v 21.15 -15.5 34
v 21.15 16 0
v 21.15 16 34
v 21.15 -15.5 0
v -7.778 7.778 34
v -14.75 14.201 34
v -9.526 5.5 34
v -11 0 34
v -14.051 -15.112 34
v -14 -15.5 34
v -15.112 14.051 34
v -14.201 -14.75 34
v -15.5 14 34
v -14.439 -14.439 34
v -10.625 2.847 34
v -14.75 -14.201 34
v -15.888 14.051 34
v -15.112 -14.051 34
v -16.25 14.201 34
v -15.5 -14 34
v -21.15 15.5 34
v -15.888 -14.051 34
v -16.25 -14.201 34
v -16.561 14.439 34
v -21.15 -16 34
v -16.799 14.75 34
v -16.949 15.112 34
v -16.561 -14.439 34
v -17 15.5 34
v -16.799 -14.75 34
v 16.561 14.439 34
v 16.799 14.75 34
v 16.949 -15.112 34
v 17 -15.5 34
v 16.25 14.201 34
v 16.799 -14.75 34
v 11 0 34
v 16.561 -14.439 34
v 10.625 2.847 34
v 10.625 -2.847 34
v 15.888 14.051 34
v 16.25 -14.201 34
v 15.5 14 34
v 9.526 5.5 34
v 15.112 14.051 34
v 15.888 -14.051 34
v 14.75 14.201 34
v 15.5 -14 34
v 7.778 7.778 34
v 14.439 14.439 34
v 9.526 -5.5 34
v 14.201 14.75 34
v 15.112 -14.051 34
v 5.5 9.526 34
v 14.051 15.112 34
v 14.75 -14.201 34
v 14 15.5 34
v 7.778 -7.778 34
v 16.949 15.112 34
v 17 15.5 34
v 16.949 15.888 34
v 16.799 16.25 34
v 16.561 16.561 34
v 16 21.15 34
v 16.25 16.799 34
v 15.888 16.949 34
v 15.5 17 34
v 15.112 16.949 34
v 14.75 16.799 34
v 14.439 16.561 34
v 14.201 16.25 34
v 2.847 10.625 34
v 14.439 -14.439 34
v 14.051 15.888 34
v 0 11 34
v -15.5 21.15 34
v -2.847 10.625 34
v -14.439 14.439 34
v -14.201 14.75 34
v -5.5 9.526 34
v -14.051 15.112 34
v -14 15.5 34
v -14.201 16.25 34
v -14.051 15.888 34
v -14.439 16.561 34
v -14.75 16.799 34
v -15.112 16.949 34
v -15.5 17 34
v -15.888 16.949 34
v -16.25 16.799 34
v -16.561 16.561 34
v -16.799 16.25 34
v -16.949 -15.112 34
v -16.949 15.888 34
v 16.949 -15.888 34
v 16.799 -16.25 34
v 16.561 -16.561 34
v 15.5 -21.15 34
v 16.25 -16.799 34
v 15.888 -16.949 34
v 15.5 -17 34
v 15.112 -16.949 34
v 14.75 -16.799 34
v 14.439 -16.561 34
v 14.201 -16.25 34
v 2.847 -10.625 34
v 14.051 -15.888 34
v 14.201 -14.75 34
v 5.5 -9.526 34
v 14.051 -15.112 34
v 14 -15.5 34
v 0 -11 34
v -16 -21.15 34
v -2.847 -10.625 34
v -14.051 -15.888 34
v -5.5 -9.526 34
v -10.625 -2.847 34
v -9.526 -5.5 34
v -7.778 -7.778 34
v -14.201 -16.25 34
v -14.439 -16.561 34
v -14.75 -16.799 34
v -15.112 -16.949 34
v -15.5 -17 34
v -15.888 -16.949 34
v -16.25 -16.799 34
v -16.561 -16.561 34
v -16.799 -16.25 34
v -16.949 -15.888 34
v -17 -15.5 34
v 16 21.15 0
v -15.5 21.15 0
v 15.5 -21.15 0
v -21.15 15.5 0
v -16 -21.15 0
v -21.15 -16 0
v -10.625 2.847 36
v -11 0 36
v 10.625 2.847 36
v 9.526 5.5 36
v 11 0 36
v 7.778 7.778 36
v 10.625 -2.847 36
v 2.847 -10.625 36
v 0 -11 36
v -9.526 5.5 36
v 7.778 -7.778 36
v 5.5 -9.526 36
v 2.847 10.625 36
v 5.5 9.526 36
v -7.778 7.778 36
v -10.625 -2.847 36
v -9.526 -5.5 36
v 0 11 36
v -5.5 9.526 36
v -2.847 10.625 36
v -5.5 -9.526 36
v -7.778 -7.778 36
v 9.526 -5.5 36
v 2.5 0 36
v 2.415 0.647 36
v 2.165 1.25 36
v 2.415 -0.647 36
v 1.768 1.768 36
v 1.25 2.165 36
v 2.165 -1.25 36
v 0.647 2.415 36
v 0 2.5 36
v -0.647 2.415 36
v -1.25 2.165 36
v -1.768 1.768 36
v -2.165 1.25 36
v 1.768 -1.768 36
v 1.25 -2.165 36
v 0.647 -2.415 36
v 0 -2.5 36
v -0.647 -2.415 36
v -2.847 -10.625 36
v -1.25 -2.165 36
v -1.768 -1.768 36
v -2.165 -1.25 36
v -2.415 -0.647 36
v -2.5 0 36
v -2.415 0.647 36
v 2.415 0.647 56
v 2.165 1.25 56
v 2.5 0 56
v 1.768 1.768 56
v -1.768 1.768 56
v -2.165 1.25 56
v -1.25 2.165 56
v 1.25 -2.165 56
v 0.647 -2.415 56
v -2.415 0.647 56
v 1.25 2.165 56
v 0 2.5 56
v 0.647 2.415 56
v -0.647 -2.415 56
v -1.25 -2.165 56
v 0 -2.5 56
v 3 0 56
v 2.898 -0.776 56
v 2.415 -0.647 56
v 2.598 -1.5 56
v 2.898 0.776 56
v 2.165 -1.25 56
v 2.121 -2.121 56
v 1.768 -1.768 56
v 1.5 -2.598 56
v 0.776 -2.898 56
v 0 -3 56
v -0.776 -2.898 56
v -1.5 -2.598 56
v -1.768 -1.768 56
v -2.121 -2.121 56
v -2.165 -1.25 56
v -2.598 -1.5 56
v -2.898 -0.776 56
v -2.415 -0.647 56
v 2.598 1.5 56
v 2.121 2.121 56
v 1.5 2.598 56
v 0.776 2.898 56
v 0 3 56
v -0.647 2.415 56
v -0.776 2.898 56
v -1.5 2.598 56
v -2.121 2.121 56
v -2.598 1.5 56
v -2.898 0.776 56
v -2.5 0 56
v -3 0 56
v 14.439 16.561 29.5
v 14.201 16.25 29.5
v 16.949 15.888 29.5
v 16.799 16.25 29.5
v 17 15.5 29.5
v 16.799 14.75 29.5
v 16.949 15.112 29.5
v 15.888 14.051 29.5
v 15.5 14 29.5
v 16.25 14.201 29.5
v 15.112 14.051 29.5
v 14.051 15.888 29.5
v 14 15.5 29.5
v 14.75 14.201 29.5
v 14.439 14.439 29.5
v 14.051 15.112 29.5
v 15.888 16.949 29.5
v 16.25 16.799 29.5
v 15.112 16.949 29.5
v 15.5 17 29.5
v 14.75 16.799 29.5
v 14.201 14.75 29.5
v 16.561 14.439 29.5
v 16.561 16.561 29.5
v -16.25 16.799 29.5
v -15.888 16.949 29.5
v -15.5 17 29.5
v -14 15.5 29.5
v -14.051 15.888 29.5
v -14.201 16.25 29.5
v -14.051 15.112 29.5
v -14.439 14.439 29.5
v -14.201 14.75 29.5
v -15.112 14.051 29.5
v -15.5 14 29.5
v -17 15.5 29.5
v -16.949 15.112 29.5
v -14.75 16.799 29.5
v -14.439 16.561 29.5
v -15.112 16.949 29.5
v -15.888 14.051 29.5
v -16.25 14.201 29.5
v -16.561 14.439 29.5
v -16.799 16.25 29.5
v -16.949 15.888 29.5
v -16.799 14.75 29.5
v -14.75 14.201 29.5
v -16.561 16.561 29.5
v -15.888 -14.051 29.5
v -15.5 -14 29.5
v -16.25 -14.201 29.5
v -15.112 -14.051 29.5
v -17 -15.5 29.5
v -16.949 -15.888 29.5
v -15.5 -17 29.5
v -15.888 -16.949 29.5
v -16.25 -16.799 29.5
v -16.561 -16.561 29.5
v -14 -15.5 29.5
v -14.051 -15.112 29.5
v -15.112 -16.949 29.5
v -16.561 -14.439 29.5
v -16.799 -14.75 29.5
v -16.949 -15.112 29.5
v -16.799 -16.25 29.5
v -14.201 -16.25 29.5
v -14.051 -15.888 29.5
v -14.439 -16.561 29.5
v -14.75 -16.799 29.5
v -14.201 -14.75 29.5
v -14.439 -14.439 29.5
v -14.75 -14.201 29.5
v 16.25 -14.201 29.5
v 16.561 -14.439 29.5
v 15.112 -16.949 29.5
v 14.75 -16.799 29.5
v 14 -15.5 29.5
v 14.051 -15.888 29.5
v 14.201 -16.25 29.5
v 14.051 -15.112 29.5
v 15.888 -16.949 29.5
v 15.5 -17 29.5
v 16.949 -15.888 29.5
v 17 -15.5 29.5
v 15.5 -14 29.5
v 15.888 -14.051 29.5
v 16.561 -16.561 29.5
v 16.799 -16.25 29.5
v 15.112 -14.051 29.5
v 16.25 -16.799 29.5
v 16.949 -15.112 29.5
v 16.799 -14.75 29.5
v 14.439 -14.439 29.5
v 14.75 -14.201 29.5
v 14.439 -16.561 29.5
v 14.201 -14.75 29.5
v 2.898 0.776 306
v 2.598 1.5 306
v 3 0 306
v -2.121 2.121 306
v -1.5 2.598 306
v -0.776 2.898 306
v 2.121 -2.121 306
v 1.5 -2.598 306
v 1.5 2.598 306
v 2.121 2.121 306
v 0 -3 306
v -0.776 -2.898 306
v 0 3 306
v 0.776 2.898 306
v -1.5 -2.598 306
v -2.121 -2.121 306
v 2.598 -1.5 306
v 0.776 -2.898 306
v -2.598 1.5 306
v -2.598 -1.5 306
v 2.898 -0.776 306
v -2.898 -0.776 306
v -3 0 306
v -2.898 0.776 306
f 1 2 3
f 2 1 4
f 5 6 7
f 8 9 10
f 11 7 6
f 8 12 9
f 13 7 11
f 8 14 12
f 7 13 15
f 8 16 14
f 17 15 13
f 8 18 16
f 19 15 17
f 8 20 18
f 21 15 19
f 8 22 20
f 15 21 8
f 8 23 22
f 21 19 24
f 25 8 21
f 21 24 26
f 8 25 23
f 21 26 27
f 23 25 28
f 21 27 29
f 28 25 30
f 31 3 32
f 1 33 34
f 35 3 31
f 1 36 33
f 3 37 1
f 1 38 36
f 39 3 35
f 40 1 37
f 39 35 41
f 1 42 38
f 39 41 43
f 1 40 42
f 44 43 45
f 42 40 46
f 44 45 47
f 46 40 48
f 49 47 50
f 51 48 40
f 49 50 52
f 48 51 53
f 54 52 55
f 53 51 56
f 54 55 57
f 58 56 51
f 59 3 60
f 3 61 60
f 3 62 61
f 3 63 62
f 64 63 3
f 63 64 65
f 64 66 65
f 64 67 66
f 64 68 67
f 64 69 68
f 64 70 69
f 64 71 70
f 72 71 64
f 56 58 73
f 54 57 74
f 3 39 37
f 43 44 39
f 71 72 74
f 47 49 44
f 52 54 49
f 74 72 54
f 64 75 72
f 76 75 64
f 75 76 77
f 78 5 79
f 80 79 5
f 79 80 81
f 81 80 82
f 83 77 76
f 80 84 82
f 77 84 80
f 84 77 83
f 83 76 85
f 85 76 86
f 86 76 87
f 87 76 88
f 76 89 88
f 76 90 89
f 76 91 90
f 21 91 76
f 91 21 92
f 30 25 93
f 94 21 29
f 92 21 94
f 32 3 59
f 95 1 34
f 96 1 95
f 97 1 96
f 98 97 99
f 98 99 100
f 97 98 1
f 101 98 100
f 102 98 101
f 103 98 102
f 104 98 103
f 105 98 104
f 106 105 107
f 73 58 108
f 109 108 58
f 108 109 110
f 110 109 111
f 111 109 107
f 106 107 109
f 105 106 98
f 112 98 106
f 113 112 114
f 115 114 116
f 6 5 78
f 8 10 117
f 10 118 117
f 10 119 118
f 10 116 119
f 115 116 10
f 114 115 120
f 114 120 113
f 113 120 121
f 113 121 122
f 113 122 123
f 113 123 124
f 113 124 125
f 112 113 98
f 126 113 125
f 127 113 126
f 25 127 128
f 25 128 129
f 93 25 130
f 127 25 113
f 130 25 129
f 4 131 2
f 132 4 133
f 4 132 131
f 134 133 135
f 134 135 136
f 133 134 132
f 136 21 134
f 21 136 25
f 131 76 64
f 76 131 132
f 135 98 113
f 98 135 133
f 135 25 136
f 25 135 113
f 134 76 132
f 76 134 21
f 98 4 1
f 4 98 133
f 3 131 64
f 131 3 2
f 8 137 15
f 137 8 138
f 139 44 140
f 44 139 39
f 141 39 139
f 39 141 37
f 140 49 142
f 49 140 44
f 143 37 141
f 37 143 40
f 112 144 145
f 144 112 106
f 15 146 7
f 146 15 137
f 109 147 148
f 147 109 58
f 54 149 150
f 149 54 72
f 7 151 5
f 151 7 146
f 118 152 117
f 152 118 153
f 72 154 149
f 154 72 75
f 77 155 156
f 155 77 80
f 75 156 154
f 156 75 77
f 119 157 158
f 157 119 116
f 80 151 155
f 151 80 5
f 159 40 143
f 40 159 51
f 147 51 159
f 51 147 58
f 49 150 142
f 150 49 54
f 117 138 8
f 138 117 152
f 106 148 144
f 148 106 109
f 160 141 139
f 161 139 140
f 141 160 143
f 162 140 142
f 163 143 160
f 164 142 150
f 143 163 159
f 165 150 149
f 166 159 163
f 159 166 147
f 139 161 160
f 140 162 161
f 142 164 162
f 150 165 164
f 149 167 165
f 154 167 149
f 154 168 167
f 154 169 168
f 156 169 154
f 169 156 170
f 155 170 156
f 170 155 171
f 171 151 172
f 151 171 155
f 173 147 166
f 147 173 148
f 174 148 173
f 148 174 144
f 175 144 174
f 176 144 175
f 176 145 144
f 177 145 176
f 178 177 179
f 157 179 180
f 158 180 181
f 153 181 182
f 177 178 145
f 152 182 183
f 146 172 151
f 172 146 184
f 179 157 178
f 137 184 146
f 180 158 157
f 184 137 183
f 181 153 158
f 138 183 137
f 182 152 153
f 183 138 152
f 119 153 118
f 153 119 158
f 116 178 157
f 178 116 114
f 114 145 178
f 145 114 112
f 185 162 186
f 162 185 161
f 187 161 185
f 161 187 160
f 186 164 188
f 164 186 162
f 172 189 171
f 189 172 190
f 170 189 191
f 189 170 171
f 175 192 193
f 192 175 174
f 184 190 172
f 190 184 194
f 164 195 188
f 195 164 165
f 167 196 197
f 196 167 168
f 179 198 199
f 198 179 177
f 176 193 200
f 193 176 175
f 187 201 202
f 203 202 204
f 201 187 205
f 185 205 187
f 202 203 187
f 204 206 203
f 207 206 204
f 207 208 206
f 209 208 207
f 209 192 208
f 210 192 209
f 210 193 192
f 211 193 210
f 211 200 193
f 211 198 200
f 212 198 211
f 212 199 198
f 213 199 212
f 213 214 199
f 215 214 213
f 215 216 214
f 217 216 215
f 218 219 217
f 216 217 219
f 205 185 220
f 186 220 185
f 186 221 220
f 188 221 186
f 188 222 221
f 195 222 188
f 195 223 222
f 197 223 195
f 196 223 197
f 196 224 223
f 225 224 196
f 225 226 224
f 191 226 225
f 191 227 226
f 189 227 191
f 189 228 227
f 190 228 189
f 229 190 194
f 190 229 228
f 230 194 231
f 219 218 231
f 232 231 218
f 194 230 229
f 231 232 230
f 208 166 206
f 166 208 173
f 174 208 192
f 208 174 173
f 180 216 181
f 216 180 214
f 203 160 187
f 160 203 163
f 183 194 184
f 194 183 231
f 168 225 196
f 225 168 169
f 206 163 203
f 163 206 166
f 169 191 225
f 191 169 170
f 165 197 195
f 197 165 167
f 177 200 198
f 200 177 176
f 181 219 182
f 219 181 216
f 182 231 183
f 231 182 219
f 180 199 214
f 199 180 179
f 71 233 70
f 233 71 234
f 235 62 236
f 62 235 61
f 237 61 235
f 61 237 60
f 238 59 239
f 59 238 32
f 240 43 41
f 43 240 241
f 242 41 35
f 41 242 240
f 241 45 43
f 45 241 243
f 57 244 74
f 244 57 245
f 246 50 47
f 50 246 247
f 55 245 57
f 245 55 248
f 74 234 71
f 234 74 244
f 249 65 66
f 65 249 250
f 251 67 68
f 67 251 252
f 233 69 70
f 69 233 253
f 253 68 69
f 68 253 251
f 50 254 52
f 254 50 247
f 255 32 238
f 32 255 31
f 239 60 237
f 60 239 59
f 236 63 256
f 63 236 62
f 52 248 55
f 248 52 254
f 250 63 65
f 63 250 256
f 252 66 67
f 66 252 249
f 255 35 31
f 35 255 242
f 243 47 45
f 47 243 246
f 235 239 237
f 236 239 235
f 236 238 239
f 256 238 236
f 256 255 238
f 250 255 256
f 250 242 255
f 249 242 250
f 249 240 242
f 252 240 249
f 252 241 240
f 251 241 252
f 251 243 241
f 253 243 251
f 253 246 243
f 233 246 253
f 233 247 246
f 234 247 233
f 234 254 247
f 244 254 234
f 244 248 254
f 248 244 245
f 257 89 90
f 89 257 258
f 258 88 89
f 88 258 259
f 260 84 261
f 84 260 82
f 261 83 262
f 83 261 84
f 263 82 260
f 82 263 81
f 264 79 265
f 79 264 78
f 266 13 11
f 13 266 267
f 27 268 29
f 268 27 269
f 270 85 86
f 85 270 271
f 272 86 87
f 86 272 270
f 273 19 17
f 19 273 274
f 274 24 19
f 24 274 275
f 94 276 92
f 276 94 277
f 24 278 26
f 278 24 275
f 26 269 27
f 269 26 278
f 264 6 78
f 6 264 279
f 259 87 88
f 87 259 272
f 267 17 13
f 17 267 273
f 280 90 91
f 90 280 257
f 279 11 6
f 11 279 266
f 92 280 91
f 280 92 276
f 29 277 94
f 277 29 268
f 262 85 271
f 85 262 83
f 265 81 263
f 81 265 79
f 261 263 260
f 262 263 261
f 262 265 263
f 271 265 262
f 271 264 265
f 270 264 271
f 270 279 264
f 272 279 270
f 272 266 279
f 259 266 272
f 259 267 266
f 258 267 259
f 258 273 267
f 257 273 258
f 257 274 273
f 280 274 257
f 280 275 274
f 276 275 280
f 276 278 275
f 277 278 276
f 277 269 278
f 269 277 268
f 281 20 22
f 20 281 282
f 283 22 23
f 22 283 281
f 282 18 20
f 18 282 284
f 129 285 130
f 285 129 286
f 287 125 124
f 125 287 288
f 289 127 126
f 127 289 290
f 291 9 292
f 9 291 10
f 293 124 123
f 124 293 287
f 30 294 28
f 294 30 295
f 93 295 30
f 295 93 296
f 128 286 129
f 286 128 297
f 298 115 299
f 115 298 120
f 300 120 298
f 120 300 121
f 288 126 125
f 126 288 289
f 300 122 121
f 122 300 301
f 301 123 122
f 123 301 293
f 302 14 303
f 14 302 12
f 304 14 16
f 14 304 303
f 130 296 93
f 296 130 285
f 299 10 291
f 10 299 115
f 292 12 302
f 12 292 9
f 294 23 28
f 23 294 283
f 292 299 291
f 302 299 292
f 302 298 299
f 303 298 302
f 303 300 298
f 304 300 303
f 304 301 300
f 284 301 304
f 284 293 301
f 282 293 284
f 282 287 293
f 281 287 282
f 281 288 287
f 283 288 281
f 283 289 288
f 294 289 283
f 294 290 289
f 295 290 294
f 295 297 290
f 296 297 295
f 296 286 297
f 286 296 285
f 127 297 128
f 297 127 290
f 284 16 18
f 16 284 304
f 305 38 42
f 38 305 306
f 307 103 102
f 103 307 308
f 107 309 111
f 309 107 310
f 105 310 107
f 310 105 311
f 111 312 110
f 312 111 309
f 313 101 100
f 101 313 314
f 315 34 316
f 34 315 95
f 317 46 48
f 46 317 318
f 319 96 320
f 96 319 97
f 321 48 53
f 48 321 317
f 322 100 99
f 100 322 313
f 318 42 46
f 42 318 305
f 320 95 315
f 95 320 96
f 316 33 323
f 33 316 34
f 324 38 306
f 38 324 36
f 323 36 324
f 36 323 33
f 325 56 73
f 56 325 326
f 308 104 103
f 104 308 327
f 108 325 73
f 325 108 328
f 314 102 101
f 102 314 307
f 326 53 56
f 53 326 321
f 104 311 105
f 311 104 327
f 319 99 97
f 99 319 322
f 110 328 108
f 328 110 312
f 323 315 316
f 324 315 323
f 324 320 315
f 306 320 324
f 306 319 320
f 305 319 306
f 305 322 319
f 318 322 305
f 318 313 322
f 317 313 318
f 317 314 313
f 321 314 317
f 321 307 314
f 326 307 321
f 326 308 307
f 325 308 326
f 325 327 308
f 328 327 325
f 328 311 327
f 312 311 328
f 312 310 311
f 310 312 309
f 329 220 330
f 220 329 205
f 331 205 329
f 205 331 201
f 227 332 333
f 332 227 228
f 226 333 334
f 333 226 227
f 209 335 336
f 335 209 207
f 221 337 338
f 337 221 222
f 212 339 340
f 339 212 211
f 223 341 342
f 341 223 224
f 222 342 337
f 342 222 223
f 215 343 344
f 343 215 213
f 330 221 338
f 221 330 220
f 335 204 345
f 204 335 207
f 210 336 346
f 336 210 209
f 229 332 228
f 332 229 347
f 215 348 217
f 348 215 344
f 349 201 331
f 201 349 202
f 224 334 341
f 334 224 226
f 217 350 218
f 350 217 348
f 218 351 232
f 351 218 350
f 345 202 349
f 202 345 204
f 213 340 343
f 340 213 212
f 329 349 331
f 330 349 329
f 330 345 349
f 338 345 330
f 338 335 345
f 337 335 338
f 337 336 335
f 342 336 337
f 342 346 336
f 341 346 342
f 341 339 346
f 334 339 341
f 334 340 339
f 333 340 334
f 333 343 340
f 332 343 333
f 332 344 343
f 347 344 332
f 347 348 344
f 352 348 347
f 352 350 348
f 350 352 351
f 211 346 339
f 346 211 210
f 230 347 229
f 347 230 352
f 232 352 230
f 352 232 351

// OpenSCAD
module nema17() {
  motor_height = 34.0;
	difference(){
	  union(){
			translate([0,0,motor_height/2]) {
				intersection(){
					cube([42.3,42.3,motor_height], center = true);
					rotate([0,0,45]) translate([0,0,-1])
            cube([74.3*sin(45), 73.3*sin(45) ,motor_height+2], center = true);
				}
			}
			translate([0, 0, motor_height-.1]) cylinder(h=2.1, r=11, $fn=24);
			translate([0, 0, motor_height+2]) cylinder(h=20, r=2.5, $fn=24);
		}
		for(i=[0:3]){
				rotate([0, 0, 90*i])translate([15.5, 15.5, motor_height-4.5]) cylinder(h=5, r=1.5, $fn=24);
			}
	}
}

module nema17_simple() {
  motor_height = 34.0;
  translate([0,0,motor_height/2]) {
    intersection(){
      cube([42.3,42.3,motor_height], center = true);
      rotate([0,0,45]) translate([0,0,-1])
        cube([74.3*sin(45), 73.3*sin(45) ,motor_height+2], center = true);
    }
  }
  translate([0, 0, motor_height-.1]) cylinder(h=2.1, r=11, $fn=24);
  translate([0, 0, motor_height+2]) cylinder(h=20, r=2.5, $fn=24);
}


module nema17_holes() {
    for(i=[0:3]){
      rotate([0, 0, 90*i]) translate([15.5, 15.5, 0]) cylinder(h=100, r=1.501, $fn=24);
    }
}

module nema17_screw() {
  translate([0,0,56])
  cylinder(h=250, r=3, $fn=24);
}
nema17_screw();
nema17();
